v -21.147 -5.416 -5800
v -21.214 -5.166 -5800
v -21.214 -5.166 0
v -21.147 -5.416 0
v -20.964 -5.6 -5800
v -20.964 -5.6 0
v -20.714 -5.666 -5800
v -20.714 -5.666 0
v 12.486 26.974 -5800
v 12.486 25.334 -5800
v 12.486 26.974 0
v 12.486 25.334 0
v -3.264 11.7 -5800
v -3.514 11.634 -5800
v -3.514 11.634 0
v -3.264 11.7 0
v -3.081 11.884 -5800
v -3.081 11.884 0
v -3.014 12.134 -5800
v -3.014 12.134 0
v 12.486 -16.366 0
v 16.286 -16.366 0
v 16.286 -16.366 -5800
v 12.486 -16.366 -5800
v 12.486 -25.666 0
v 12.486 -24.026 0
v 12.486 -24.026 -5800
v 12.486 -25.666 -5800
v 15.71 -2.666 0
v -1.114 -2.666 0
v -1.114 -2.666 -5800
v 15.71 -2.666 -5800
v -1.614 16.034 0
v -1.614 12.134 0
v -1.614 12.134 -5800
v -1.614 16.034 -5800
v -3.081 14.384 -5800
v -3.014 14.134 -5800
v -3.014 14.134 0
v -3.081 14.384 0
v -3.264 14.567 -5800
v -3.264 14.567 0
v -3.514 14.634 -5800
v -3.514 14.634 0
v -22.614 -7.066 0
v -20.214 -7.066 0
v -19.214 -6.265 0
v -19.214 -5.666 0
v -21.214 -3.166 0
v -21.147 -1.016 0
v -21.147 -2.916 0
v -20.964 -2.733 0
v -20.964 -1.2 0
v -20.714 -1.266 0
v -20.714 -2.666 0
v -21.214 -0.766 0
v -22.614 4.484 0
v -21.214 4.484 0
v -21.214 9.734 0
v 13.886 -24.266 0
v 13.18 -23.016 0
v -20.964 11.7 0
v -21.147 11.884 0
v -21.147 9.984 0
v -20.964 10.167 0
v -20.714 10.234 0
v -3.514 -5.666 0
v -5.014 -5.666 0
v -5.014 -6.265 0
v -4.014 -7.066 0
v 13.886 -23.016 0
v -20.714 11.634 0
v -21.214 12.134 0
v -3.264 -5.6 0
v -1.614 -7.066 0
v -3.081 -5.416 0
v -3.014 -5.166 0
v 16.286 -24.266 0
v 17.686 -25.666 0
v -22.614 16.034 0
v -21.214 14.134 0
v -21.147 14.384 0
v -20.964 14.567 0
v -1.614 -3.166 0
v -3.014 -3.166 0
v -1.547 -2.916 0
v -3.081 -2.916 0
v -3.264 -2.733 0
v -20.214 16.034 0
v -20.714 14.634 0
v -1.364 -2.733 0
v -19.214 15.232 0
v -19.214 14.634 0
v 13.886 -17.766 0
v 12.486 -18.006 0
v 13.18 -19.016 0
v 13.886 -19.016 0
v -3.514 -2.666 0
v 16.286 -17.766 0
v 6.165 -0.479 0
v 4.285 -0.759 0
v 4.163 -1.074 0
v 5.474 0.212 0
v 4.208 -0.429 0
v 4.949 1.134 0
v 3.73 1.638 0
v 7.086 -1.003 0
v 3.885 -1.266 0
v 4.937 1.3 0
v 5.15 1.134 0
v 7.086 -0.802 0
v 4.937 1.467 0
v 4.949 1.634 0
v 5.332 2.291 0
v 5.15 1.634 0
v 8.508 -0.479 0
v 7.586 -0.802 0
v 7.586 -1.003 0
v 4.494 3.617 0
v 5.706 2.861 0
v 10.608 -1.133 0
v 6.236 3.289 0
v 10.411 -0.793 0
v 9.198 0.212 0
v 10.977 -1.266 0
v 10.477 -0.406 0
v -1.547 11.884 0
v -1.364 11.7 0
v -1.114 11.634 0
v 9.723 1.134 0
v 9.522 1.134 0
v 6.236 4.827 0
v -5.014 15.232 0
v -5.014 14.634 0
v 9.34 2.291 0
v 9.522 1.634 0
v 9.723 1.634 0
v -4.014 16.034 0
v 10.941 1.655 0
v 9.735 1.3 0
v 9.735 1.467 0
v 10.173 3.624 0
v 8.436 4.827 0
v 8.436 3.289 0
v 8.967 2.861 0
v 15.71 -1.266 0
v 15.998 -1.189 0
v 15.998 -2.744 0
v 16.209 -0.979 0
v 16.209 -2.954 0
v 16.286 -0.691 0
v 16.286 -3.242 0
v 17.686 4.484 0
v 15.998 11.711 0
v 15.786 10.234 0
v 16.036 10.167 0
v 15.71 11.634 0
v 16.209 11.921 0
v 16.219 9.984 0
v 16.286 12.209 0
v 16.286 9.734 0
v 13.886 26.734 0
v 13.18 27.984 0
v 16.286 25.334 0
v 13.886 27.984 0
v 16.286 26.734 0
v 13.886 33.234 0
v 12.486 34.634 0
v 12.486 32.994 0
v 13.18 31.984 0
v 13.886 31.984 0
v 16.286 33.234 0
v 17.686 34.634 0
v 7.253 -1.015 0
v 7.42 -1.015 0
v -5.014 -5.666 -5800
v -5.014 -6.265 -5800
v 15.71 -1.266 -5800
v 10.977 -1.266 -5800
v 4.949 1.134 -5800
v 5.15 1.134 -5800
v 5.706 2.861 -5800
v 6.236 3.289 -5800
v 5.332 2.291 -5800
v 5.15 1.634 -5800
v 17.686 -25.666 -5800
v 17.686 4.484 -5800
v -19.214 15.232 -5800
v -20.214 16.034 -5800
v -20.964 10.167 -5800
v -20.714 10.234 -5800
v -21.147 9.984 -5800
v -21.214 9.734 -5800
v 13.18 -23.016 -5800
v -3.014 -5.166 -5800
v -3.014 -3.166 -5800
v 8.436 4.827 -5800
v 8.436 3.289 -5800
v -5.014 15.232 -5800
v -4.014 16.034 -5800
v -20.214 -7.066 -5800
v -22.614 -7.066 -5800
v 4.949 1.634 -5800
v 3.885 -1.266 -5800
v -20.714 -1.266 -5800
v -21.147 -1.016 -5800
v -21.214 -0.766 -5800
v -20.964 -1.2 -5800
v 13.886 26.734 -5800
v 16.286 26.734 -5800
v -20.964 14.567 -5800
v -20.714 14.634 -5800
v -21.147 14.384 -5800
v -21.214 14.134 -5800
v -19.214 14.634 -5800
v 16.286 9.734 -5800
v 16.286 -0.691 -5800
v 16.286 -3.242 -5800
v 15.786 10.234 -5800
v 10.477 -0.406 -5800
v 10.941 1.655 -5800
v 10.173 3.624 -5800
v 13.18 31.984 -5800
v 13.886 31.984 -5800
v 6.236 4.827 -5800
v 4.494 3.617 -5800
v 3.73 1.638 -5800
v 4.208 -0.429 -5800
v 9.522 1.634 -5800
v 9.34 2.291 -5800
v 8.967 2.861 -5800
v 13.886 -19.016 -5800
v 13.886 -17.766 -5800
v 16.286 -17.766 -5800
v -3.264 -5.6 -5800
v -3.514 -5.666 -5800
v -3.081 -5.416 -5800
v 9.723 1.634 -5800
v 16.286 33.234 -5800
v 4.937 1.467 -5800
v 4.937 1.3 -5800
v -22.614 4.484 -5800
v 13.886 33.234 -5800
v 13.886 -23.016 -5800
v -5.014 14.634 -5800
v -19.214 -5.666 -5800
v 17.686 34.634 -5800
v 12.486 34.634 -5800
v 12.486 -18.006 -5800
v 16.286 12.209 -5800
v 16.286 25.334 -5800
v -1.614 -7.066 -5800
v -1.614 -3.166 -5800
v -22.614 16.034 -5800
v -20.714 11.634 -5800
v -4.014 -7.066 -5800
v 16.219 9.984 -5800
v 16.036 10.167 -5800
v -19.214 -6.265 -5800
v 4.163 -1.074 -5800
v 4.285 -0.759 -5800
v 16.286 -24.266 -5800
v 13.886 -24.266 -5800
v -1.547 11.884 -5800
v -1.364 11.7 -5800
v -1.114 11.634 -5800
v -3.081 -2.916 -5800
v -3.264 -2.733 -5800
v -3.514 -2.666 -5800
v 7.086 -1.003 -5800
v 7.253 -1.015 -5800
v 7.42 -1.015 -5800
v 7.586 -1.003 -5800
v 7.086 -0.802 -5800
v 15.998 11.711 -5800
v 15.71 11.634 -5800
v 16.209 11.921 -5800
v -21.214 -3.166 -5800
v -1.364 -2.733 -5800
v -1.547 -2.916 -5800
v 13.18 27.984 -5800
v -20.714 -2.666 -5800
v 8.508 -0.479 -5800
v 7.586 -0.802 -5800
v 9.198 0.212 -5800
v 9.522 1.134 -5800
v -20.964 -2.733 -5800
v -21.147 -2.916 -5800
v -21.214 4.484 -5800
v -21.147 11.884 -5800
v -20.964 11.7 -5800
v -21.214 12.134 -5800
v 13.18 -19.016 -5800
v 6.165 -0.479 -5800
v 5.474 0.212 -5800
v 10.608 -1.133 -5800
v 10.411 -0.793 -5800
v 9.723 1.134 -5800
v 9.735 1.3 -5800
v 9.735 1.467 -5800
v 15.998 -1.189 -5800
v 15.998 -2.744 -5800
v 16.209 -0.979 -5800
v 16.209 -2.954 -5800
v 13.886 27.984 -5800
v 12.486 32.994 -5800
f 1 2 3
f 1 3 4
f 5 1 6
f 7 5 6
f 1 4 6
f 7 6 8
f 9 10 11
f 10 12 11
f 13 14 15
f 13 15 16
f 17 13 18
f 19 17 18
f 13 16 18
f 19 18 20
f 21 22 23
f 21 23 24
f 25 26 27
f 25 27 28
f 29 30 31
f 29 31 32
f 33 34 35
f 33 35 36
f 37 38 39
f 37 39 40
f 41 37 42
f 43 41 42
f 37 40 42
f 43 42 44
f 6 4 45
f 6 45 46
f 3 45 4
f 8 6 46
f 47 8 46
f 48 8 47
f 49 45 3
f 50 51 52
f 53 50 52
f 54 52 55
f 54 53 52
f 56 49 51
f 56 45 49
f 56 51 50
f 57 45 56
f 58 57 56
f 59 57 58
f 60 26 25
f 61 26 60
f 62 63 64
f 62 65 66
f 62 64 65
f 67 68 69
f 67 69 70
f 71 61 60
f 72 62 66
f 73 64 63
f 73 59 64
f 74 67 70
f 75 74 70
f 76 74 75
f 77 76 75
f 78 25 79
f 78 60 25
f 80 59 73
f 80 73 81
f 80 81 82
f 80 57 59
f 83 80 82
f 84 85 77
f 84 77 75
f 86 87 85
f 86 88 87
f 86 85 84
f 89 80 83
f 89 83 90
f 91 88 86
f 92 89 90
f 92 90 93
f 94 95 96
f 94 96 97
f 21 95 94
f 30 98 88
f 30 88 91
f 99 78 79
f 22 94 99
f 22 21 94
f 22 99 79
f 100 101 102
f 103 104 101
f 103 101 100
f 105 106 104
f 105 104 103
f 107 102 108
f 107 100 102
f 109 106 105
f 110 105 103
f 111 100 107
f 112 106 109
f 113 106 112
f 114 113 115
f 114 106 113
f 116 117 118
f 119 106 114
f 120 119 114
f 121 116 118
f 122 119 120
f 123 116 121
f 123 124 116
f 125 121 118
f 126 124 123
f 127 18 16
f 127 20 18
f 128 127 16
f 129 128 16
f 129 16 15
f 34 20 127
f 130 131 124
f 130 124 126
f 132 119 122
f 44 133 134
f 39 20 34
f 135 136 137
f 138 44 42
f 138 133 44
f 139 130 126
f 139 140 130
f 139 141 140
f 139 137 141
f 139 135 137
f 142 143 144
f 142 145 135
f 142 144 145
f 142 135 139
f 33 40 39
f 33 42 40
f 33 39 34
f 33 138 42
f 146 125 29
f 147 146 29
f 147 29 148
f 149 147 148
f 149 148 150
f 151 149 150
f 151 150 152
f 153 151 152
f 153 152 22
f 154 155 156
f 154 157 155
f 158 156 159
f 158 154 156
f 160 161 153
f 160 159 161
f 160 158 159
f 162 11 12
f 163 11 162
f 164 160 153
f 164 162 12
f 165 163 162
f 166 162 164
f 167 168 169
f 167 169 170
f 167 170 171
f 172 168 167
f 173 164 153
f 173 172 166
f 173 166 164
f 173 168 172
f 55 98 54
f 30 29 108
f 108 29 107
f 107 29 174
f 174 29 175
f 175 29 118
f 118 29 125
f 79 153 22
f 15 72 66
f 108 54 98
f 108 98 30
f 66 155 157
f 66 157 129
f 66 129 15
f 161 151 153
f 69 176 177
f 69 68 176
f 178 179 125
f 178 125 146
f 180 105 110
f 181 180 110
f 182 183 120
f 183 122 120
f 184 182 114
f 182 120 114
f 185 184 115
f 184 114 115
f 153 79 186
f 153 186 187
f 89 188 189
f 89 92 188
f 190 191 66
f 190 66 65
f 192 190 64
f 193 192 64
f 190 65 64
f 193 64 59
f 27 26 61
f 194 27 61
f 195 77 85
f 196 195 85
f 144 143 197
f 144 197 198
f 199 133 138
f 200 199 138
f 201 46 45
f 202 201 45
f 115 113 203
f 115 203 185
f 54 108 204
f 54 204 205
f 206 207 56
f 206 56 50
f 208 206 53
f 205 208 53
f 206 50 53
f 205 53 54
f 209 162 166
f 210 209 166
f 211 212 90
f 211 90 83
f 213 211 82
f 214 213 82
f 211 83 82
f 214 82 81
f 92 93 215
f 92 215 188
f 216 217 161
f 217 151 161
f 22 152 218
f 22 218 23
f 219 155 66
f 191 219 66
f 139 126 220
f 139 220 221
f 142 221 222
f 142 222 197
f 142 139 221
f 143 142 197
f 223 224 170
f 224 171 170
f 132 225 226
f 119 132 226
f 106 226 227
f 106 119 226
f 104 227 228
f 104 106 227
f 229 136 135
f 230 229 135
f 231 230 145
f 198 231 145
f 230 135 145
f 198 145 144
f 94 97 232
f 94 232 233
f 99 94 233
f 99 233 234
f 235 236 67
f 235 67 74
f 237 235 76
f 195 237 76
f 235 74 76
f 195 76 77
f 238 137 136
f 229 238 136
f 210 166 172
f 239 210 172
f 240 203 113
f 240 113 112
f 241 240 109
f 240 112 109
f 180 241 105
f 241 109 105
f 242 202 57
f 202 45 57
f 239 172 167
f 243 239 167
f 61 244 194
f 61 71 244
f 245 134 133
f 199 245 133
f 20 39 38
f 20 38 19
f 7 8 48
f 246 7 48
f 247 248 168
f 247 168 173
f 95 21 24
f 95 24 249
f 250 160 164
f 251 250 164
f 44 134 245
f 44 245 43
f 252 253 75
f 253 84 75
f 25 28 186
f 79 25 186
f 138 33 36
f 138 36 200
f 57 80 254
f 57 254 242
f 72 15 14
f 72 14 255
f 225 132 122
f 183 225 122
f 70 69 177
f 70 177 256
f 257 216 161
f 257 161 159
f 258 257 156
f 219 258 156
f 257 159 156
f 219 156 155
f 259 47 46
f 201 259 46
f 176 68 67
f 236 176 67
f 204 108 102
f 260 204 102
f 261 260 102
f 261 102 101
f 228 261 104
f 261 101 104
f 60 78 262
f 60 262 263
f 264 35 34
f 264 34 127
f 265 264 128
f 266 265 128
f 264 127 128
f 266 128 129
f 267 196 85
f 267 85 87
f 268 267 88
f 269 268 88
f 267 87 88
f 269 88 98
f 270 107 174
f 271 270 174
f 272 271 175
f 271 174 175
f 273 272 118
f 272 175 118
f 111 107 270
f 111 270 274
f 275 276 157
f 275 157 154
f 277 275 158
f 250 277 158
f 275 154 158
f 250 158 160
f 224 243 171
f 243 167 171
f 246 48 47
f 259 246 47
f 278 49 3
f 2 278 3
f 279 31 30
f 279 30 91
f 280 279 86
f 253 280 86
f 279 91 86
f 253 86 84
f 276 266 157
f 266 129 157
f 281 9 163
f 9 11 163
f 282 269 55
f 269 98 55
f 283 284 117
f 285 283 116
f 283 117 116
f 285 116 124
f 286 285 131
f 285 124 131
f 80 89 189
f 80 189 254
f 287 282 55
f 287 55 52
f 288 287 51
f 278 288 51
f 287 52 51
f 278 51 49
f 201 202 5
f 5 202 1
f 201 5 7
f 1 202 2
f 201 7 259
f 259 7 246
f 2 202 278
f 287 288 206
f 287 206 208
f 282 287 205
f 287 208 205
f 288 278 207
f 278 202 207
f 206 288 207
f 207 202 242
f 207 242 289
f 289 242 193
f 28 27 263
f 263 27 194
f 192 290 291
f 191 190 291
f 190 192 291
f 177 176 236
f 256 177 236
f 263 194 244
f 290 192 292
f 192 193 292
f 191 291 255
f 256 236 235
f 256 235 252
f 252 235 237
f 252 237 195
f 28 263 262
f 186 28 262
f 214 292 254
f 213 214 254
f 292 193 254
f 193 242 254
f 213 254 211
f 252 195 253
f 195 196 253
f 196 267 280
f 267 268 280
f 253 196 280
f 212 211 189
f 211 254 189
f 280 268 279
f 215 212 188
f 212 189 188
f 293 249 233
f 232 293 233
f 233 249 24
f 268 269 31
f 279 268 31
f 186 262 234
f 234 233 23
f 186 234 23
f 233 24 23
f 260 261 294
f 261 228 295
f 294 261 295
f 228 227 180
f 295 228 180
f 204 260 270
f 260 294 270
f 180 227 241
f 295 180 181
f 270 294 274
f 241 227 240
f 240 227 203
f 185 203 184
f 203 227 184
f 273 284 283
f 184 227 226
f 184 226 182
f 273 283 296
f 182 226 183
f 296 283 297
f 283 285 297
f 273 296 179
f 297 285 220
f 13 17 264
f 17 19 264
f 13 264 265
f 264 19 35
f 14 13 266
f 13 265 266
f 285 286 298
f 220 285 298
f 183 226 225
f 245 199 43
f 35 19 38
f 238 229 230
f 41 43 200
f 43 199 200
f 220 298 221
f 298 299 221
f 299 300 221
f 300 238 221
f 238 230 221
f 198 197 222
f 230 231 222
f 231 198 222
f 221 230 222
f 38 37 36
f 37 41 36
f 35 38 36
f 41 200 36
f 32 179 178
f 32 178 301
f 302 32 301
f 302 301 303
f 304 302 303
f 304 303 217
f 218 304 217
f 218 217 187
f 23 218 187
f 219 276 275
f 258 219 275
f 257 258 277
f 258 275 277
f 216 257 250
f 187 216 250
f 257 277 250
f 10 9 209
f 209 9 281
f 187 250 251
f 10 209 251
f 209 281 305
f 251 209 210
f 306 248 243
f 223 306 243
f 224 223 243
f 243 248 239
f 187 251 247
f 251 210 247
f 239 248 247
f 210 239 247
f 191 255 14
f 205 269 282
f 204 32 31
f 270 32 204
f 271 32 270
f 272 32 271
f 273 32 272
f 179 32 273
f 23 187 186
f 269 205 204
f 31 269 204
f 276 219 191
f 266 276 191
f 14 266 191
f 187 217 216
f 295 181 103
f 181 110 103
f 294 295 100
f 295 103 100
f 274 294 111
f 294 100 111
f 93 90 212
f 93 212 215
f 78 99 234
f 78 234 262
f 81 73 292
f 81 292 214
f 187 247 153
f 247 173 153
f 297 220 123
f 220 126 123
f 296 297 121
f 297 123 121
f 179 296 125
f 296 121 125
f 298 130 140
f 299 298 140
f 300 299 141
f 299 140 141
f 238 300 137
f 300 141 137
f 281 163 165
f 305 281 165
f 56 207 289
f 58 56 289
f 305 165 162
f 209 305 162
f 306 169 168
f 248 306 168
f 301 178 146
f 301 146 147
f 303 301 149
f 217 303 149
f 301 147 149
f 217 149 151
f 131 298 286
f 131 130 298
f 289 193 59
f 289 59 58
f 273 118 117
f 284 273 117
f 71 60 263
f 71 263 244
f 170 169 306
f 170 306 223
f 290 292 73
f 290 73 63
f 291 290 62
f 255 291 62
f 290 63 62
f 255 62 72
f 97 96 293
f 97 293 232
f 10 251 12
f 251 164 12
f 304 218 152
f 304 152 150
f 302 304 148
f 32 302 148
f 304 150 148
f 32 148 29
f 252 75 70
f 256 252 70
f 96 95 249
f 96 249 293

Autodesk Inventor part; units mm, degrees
ref_plane "YZ Plane" through (0, 0, 0) normal (1, 0, 0) x (0, 1, 0)
ref_plane "XZ Plane" through (0, 0, 0) normal (0, 1, 0) x (-1, 0, 0)
ref_plane "XY Plane" through (0, 0, 0) normal (0, 0, 1) x (1, 0, 0)
sketch "Boceto1" plane through (0, 0, 0) normal (0, 0, 1) x (1, 0, 0)
  line L0 (-1.1139, -2.6665) -> (15.7105, -2.6665)
  line L1 (16.2861, -3.2421) -> (16.2861, -16.3665)
  line L2 (16.2861, -16.3665) -> (12.4861, -16.3665)
  line L3 (12.4861, -16.3665) -> (12.4861, -18.0065)
  line L4 (13.1802, -19.0165) -> (13.8861, -19.0165)
  line L5 (13.8861, -19.0165) -> (13.8861, -17.7665)
  line L6 (13.8861, -17.7665) -> (16.2861, -17.7665)
  line L7 (16.2861, -17.7665) -> (16.2861, -24.2665)
  line L8 (16.2861, -24.2665) -> (13.8861, -24.2665)
  line L9 (13.8861, -24.2665) -> (13.8861, -23.0165)
  line L10 (13.8861, -23.0165) -> (13.1802, -23.0165)
  line L11 (12.4861, -24.0265) -> (12.4861, -25.6665)
  line L12 (12.4861, -25.6665) -> (17.6861, -25.6665)
  line L13 (17.6861, -25.6665) -> (17.6861, 4.4835)
  line L14 (16.2861, -0.6909) -> (16.2861, 9.7335)
  line L15 (7.3361, 2.6189) -> (7.3361, -2.6665) construction
  arc A0 (6.2361, 3.2888) -> (8.4361, 3.2888) centre (7.3361, 1.3835) ccw
  line L16 (4.9491, 1.1335) -> (5.1503, 1.1335)
  line L17 (4.9491, 1.6335) -> (5.1503, 1.6335)
  line L18 (10.9772, -1.2665) -> (15.7105, -1.2665)
  line L19 (9.723, 1.1335) -> (9.5218, 1.1335)
  line L20 (9.723, 1.6335) -> (9.5218, 1.6335)
  line L21 (7.5861, -1.0034) -> (7.5861, -0.8022)
  line L22 (7.0861, -1.0034) -> (7.0861, -0.8022)
  arc A1 (7.0861, -1.0034) -> (7.5861, -1.0034) centre (7.3361, 1.3835) ccw
  arc A2 (9.723, 1.1335) -> (9.723, 1.6335) centre (7.3361, 1.3835) ccw
  arc A3 (4.9491, 1.6335) -> (4.9491, 1.1335) centre (7.3361, 1.3835) ccw
  circle A4 centre (7.3361, 1.3835) radius 2.4 construction
  line L23 (6.2361, 4.8271) -> (6.2361, 3.2888)
  line L24 (8.4361, 4.8271) -> (8.4361, 3.2888)
  arc A5 (10.4771, -0.406) -> (8.4361, 4.8271) centre (7.3361, 1.3835) ccw
  arc A6 (6.2361, 4.8271) -> (4.2085, -0.4294) centre (7.3361, 1.3835) ccw
  line L25 (12.4861, -18.0065) -> (13.1802, -19.0165)
  line L26 (12.4861, -24.0265) -> (13.1802, -23.0165)
  arc A7 (15.7105, -1.2665) -> (16.2861, -0.6909) centre (15.7105, -0.6909) ccw
  arc A8 (16.2861, -3.2421) -> (15.7105, -2.6665) centre (15.7105, -3.2421) ccw
  arc A9 (3.8851, -1.2665) -> (4.2085, -0.4294) centre (3.7105, -0.718) ccw
  arc A10 (10.4771, -0.406) -> (10.9772, -1.2665) centre (10.9772, -0.6909) ccw
  line L27 (-26.537, 4.4835) -> (21.9694, 4.4835) construction
  line L28 (-1.6139, -3.1665) -> (-1.6139, -7.0665)
  line L29 (-1.6139, -7.0665) -> (-4.0139, -7.0665)
  line L30 (-5.0139, -5.6665) -> (-3.5139, -5.6665)
  line L31 (-3.0139, -5.1665) -> (-3.0139, -3.1665)
  line L32 (-3.5139, -2.6665) -> (-20.7139, -2.6665)
  line L33 (-21.2139, -3.1665) -> (-21.2139, -5.1665)
  line L34 (-20.7139, -5.6665) -> (-19.2139, -5.6665)
  line L35 (-20.2139, -7.0665) -> (-22.6139, -7.0665)
  line L36 (3.8851, -1.2665) -> (-20.7139, -1.2665)
  line L37 (-21.2139, -0.7665) -> (-21.2139, 4.4835)
  line L38 (-22.6139, -7.0665) -> (-22.6139, 4.4835)
  line L39 (-19.2139, -5.6665) -> (-19.2139, -6.2653)
  line L40 (-19.2139, -6.2653) -> (-20.2139, -7.0665)
  line L41 (-5.0139, -5.6665) -> (-5.0139, -6.2653)
  line L42 (-5.0139, -6.2653) -> (-4.0139, -7.0665)
  line L43 (4.3997, 1.3835) -> (10.1666, 1.3835) construction
  arc A11 (-1.1139, -2.6665) -> (-1.6139, -3.1665) centre (-1.1139, -3.1665) ccw
  arc A12 (-3.0139, -3.1665) -> (-3.5139, -2.6665) centre (-3.5139, -3.1665) ccw
  arc A13 (-3.5139, -5.6665) -> (-3.0139, -5.1665) centre (-3.5139, -5.1665) ccw
  arc A14 (-20.7139, -2.6665) -> (-21.2139, -3.1665) centre (-20.7139, -3.1665) ccw
  arc A15 (-21.2139, -5.1665) -> (-20.7139, -5.6665) centre (-20.7139, -5.1665) ccw
  arc A16 (-21.2139, -0.7665) -> (-20.7139, -1.2665) centre (-20.7139, -0.7665) ccw
  line L44 (-1.1139, 11.6335) -> (15.7105, 11.6335)
  line L45 (16.2861, 12.2091) -> (16.2861, 25.3335)
  line L46 (16.2861, 25.3335) -> (12.4861, 25.3335)
  line L47 (12.4861, 25.3335) -> (12.4861, 26.9735)
  line L48 (13.1802, 27.9835) -> (13.8861, 27.9835)
  line L49 (13.8861, 27.9835) -> (13.8861, 26.7335)
  line L50 (13.8861, 26.7335) -> (16.2861, 26.7335)
  line L51 (16.2861, 26.7335) -> (16.2861, 33.2335)
  line L52 (16.2861, 33.2335) -> (13.8861, 33.2335)
  line L53 (13.8861, 33.2335) -> (13.8861, 31.9835)
  line L54 (13.8861, 31.9835) -> (13.1802, 31.9835)
  line L55 (12.4861, 32.9935) -> (12.4861, 34.6335)
  line L56 (12.4861, 34.6335) -> (17.6861, 34.6335)
  line L57 (17.6861, 34.6335) -> (17.6861, 4.4835)
  line L58 (12.4861, 26.9735) -> (13.1802, 27.9835)
  line L59 (12.4861, 32.9935) -> (13.1802, 31.9835)
  arc A17 (15.7105, 11.6335) -> (16.2861, 12.2091) centre (15.7105, 12.2091) ccw
  line L60 (-1.6139, 12.1335) -> (-1.6139, 16.0335)
  line L61 (-1.6139, 16.0335) -> (-4.0139, 16.0335)
  line L62 (-5.0139, 14.6335) -> (-3.5139, 14.6335)
  line L63 (-3.0139, 14.1335) -> (-3.0139, 12.1335)
  line L64 (-3.5139, 11.6335) -> (-20.7139, 11.6335)
  line L65 (-21.2139, 12.1335) -> (-21.2139, 14.1335)
  line L66 (-20.7139, 14.6335) -> (-19.2139, 14.6335)
  line L67 (-20.2139, 16.0335) -> (-22.6139, 16.0335)
  line L68 (15.7861, 10.2335) -> (-20.7139, 10.2335)
  line L69 (-21.2139, 9.7335) -> (-21.2139, 4.4835)
  line L70 (-22.6139, 16.0335) -> (-22.6139, 4.4835)
  line L71 (-19.2139, 14.6335) -> (-19.2139, 15.2323)
  line L72 (-19.2139, 15.2323) -> (-20.2139, 16.0335)
  line L73 (-5.0139, 14.6335) -> (-5.0139, 15.2323)
  line L74 (-5.0139, 15.2323) -> (-4.0139, 16.0335)
  arc A18 (-1.6139, 12.1335) -> (-1.1139, 11.6335) centre (-1.1139, 12.1335) ccw
  arc A19 (-3.5139, 11.6335) -> (-3.0139, 12.1335) centre (-3.5139, 12.1335) ccw
  arc A20 (-3.0139, 14.1335) -> (-3.5139, 14.6335) centre (-3.5139, 14.1335) ccw
  arc A21 (-21.2139, 12.1335) -> (-20.7139, 11.6335) centre (-20.7139, 12.1335) ccw
  arc A22 (-20.7139, 14.6335) -> (-21.2139, 14.1335) centre (-20.7139, 14.1335) ccw
  arc A23 (-20.7139, 10.2335) -> (-21.2139, 9.7335) centre (-20.7139, 9.7335) ccw
  arc A24 (16.2861, 9.7335) -> (15.7861, 10.2335) centre (15.7861, 9.7335) ccw
  point P0 (4.8546, -1.2453)
  point P1 (9.7949, -1.2665)
  point P2 (7.2983, -2.6665)
  point P3 (16.2861, -21.0165)
  point P4 (5.0497, 1.6335)
  point P5 (9.6224, 1.6335)
  point P6 (16.2861, 29.9835)
  dimension "d4" = 1.4
  dimension "d5" = 1.4
  dimension "d6" = 1.4
  dimension "d7" = 1.4
  dimension "d8" = 1.4
  dimension "d9" = 1.4
  dimension "d12" = 4.4
  dimension "d19" = 0.5
  dimension "d22" = 4.05
  dimension "d26" = 0.5
  dimension "d30" = 0.5
  dimension "d32" = 4.8
  dimension "d35" = 1.1
  dimension "d36" = 2.2
  dimension "d37" = 1.415
  dimension "d38" = 1.415
  dimension "d39" = 0.2
  dimension "d40" = 0.2
  dimension "d43" = 23
  dimension "d44" = 4
  dimension "d45" = 9.3
  dimension "d46" = 6.5
  dimension "d50" = 5.2
  dimension "d53" = 0.2
  dimension "d55" = 0.2
  dimension "d56" = 0.25
  dimension "d57" = 0.2
  dimension "d58" = 1.4
  dimension "d66" = 2
  dimension "d67" = 2
  dimension "d68" = 2.4
  dimension "d69" = 3.01
  dimension "d70" = 6.02
  dimension "d71" = 34.5
  dimension "d72" = 111
  dimension "d74" = 0.7058
  dimension "d75" = 0.7058
  dimension "d90" = 30.15
  dimension "d91" = 1.4
  dimension "d92" = 1.4
  dimension "d93" = 1.4
  dimension "d94" = 1.4
  dimension "d96" = 3
  dimension "d97" = 14.2
  dimension "d98" = 18.2
  dimension "d99" = 21
  dimension "d100" = 40.3
  dimension "d101" = 10.35
  dimension "d102" = 0.25
  dimension "d103" = 0.25
  dimension "d105" = 3.4
  dimension "d106" = 3.4
  dimension "d107" = 1
  dimension "d108" = 38.7
  dimension "d109" = 38.7
  dimension "d118" = 0.5
  dimension "d143" = 0.5
  dimension "d144" = 60.3
  dimension "d145" = 14.3
  dimension "d146" = 23.1
  dimension "d147" = 11.5
  dimension "d148" = 0.5756
  dimension "d149" = 1.4
  dimension "d150" = 4.2833
extrude "Extrusión1" add sketch "Boceto1" against normal blind 5800
properties part number "PLANTILLA SP40-04A TRAVESAÑO CENTRAL" material "Aluminio"
